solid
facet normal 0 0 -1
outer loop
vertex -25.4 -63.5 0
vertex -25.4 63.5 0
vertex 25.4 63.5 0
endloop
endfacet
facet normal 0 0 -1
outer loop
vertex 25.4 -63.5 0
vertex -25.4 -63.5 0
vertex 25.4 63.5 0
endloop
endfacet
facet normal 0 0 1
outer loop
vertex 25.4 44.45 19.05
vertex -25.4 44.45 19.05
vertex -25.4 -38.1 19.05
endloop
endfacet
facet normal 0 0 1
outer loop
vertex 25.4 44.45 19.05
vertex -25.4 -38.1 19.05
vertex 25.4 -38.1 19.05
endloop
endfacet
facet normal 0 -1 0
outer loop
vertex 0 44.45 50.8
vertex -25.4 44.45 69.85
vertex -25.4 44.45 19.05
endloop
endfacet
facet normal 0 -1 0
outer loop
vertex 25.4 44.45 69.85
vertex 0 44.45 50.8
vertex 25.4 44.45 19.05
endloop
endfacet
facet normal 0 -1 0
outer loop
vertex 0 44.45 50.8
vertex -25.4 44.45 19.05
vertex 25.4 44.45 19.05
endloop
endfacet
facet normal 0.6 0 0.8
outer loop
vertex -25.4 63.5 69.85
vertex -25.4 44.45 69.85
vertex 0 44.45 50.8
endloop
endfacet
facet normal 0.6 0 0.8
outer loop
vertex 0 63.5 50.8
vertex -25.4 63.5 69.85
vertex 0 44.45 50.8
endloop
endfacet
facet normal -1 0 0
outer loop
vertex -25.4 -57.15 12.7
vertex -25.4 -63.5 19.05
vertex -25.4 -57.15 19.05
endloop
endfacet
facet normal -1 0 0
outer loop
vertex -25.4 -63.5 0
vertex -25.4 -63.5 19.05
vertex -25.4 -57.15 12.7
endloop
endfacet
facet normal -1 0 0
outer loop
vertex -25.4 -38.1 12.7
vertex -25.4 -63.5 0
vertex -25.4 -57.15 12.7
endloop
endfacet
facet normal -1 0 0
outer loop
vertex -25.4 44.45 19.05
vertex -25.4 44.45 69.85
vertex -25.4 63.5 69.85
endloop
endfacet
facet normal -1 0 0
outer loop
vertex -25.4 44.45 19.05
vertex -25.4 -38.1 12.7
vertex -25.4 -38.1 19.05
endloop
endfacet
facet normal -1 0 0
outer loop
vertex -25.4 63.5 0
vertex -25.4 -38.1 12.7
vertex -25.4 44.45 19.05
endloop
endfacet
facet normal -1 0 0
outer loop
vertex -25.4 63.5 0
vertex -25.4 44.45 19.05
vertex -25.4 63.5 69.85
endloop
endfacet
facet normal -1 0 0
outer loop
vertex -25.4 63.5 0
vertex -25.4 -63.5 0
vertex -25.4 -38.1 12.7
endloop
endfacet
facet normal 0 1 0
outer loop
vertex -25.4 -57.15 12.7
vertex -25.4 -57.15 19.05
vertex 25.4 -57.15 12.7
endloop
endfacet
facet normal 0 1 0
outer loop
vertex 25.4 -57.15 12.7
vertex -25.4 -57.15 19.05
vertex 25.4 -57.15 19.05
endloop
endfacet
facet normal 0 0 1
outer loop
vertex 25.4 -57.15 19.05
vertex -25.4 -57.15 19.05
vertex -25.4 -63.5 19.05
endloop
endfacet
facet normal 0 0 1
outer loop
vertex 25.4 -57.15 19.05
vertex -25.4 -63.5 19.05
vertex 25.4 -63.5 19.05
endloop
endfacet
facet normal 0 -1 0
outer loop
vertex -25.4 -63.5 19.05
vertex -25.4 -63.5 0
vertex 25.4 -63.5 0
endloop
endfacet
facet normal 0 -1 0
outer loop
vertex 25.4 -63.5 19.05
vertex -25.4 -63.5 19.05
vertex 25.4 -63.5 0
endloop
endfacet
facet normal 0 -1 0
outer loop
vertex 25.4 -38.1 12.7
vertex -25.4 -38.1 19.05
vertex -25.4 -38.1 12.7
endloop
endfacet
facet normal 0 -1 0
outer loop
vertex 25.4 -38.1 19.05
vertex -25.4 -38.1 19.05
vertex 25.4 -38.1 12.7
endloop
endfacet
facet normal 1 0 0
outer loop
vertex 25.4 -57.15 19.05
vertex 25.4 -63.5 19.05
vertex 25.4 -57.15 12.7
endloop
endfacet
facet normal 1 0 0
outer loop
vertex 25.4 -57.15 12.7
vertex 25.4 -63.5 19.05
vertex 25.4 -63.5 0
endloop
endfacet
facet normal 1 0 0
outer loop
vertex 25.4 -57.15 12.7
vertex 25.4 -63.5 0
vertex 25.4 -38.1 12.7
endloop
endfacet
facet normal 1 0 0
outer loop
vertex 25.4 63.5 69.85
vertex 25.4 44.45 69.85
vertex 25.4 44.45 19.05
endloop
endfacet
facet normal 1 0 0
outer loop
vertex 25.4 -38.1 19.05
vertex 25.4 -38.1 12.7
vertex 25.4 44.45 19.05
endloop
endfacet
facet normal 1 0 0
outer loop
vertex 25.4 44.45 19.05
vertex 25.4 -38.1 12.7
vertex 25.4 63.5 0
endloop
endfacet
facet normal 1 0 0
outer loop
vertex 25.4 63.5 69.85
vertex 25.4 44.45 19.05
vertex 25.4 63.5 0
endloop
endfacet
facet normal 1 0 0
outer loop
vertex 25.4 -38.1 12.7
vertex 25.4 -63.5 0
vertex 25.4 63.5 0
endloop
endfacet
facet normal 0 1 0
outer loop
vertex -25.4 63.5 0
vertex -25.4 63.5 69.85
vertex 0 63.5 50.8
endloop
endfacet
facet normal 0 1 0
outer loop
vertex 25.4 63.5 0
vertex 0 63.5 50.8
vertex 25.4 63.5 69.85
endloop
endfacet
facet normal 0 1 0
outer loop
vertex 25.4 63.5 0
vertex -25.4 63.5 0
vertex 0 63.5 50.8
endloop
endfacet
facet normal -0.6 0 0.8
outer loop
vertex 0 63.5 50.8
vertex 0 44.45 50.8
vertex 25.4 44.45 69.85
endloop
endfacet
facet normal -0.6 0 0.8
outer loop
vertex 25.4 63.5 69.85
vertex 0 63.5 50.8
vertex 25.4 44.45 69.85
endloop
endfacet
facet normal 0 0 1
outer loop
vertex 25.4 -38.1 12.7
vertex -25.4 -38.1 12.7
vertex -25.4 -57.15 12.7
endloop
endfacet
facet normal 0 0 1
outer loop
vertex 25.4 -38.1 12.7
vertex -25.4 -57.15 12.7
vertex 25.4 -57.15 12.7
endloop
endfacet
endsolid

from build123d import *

# Parameters (mm, degrees)
F0_W          = 50.8
F0_H          = 127
F1_DEPTH      = 19.05
F2_W          = 50.8
F2_H          = 19.05
F3_DEPTH      = 6.35
F4_W          = 50.8
F4_H          = 19.05
F5_DEPTH      = 50.8
F7_DEPTH      = 19.051
F7_DEPTH_BACK = 107.951


with BuildPart() as f1:
    # F0 (on Top) → F1 (new body)
    with BuildSketch(Plane.XY):
        Rectangle(F0_W, F0_H)
    extrude(amount=F1_DEPTH)

    # F2 (on face) → F3 (cut)
    with BuildSketch(Plane.XY.offset(19.05)):
        with Locations((0, -47.625)):
            Rectangle(F2_W, F2_H)
    extrude(amount=-F3_DEPTH, mode=Mode.SUBTRACT)

    # F4 (on face) → F5 (join)
    with BuildSketch(Plane.XY.offset(19.05)):
        with Locations((0, 53.975)):
            Rectangle(F4_W, F4_H)
    extrude(amount=F5_DEPTH)

    # F6 (on face) → F7 (cut, two sides)
    with BuildSketch(Plane.XZ.offset(-44.45)) as f7_sk:
        Polygon((25.4, 69.85), (0, 69.85), (0, 50.8), align=None)
        Polygon((0, 50.8), (0, 69.85), (-25.4, 69.85), align=None)
    extrude(amount=-F7_DEPTH, mode=Mode.SUBTRACT)
    extrude(f7_sk.sketch, amount=-F7_DEPTH_BACK, mode=Mode.SUBTRACT)


solid = f1.part
